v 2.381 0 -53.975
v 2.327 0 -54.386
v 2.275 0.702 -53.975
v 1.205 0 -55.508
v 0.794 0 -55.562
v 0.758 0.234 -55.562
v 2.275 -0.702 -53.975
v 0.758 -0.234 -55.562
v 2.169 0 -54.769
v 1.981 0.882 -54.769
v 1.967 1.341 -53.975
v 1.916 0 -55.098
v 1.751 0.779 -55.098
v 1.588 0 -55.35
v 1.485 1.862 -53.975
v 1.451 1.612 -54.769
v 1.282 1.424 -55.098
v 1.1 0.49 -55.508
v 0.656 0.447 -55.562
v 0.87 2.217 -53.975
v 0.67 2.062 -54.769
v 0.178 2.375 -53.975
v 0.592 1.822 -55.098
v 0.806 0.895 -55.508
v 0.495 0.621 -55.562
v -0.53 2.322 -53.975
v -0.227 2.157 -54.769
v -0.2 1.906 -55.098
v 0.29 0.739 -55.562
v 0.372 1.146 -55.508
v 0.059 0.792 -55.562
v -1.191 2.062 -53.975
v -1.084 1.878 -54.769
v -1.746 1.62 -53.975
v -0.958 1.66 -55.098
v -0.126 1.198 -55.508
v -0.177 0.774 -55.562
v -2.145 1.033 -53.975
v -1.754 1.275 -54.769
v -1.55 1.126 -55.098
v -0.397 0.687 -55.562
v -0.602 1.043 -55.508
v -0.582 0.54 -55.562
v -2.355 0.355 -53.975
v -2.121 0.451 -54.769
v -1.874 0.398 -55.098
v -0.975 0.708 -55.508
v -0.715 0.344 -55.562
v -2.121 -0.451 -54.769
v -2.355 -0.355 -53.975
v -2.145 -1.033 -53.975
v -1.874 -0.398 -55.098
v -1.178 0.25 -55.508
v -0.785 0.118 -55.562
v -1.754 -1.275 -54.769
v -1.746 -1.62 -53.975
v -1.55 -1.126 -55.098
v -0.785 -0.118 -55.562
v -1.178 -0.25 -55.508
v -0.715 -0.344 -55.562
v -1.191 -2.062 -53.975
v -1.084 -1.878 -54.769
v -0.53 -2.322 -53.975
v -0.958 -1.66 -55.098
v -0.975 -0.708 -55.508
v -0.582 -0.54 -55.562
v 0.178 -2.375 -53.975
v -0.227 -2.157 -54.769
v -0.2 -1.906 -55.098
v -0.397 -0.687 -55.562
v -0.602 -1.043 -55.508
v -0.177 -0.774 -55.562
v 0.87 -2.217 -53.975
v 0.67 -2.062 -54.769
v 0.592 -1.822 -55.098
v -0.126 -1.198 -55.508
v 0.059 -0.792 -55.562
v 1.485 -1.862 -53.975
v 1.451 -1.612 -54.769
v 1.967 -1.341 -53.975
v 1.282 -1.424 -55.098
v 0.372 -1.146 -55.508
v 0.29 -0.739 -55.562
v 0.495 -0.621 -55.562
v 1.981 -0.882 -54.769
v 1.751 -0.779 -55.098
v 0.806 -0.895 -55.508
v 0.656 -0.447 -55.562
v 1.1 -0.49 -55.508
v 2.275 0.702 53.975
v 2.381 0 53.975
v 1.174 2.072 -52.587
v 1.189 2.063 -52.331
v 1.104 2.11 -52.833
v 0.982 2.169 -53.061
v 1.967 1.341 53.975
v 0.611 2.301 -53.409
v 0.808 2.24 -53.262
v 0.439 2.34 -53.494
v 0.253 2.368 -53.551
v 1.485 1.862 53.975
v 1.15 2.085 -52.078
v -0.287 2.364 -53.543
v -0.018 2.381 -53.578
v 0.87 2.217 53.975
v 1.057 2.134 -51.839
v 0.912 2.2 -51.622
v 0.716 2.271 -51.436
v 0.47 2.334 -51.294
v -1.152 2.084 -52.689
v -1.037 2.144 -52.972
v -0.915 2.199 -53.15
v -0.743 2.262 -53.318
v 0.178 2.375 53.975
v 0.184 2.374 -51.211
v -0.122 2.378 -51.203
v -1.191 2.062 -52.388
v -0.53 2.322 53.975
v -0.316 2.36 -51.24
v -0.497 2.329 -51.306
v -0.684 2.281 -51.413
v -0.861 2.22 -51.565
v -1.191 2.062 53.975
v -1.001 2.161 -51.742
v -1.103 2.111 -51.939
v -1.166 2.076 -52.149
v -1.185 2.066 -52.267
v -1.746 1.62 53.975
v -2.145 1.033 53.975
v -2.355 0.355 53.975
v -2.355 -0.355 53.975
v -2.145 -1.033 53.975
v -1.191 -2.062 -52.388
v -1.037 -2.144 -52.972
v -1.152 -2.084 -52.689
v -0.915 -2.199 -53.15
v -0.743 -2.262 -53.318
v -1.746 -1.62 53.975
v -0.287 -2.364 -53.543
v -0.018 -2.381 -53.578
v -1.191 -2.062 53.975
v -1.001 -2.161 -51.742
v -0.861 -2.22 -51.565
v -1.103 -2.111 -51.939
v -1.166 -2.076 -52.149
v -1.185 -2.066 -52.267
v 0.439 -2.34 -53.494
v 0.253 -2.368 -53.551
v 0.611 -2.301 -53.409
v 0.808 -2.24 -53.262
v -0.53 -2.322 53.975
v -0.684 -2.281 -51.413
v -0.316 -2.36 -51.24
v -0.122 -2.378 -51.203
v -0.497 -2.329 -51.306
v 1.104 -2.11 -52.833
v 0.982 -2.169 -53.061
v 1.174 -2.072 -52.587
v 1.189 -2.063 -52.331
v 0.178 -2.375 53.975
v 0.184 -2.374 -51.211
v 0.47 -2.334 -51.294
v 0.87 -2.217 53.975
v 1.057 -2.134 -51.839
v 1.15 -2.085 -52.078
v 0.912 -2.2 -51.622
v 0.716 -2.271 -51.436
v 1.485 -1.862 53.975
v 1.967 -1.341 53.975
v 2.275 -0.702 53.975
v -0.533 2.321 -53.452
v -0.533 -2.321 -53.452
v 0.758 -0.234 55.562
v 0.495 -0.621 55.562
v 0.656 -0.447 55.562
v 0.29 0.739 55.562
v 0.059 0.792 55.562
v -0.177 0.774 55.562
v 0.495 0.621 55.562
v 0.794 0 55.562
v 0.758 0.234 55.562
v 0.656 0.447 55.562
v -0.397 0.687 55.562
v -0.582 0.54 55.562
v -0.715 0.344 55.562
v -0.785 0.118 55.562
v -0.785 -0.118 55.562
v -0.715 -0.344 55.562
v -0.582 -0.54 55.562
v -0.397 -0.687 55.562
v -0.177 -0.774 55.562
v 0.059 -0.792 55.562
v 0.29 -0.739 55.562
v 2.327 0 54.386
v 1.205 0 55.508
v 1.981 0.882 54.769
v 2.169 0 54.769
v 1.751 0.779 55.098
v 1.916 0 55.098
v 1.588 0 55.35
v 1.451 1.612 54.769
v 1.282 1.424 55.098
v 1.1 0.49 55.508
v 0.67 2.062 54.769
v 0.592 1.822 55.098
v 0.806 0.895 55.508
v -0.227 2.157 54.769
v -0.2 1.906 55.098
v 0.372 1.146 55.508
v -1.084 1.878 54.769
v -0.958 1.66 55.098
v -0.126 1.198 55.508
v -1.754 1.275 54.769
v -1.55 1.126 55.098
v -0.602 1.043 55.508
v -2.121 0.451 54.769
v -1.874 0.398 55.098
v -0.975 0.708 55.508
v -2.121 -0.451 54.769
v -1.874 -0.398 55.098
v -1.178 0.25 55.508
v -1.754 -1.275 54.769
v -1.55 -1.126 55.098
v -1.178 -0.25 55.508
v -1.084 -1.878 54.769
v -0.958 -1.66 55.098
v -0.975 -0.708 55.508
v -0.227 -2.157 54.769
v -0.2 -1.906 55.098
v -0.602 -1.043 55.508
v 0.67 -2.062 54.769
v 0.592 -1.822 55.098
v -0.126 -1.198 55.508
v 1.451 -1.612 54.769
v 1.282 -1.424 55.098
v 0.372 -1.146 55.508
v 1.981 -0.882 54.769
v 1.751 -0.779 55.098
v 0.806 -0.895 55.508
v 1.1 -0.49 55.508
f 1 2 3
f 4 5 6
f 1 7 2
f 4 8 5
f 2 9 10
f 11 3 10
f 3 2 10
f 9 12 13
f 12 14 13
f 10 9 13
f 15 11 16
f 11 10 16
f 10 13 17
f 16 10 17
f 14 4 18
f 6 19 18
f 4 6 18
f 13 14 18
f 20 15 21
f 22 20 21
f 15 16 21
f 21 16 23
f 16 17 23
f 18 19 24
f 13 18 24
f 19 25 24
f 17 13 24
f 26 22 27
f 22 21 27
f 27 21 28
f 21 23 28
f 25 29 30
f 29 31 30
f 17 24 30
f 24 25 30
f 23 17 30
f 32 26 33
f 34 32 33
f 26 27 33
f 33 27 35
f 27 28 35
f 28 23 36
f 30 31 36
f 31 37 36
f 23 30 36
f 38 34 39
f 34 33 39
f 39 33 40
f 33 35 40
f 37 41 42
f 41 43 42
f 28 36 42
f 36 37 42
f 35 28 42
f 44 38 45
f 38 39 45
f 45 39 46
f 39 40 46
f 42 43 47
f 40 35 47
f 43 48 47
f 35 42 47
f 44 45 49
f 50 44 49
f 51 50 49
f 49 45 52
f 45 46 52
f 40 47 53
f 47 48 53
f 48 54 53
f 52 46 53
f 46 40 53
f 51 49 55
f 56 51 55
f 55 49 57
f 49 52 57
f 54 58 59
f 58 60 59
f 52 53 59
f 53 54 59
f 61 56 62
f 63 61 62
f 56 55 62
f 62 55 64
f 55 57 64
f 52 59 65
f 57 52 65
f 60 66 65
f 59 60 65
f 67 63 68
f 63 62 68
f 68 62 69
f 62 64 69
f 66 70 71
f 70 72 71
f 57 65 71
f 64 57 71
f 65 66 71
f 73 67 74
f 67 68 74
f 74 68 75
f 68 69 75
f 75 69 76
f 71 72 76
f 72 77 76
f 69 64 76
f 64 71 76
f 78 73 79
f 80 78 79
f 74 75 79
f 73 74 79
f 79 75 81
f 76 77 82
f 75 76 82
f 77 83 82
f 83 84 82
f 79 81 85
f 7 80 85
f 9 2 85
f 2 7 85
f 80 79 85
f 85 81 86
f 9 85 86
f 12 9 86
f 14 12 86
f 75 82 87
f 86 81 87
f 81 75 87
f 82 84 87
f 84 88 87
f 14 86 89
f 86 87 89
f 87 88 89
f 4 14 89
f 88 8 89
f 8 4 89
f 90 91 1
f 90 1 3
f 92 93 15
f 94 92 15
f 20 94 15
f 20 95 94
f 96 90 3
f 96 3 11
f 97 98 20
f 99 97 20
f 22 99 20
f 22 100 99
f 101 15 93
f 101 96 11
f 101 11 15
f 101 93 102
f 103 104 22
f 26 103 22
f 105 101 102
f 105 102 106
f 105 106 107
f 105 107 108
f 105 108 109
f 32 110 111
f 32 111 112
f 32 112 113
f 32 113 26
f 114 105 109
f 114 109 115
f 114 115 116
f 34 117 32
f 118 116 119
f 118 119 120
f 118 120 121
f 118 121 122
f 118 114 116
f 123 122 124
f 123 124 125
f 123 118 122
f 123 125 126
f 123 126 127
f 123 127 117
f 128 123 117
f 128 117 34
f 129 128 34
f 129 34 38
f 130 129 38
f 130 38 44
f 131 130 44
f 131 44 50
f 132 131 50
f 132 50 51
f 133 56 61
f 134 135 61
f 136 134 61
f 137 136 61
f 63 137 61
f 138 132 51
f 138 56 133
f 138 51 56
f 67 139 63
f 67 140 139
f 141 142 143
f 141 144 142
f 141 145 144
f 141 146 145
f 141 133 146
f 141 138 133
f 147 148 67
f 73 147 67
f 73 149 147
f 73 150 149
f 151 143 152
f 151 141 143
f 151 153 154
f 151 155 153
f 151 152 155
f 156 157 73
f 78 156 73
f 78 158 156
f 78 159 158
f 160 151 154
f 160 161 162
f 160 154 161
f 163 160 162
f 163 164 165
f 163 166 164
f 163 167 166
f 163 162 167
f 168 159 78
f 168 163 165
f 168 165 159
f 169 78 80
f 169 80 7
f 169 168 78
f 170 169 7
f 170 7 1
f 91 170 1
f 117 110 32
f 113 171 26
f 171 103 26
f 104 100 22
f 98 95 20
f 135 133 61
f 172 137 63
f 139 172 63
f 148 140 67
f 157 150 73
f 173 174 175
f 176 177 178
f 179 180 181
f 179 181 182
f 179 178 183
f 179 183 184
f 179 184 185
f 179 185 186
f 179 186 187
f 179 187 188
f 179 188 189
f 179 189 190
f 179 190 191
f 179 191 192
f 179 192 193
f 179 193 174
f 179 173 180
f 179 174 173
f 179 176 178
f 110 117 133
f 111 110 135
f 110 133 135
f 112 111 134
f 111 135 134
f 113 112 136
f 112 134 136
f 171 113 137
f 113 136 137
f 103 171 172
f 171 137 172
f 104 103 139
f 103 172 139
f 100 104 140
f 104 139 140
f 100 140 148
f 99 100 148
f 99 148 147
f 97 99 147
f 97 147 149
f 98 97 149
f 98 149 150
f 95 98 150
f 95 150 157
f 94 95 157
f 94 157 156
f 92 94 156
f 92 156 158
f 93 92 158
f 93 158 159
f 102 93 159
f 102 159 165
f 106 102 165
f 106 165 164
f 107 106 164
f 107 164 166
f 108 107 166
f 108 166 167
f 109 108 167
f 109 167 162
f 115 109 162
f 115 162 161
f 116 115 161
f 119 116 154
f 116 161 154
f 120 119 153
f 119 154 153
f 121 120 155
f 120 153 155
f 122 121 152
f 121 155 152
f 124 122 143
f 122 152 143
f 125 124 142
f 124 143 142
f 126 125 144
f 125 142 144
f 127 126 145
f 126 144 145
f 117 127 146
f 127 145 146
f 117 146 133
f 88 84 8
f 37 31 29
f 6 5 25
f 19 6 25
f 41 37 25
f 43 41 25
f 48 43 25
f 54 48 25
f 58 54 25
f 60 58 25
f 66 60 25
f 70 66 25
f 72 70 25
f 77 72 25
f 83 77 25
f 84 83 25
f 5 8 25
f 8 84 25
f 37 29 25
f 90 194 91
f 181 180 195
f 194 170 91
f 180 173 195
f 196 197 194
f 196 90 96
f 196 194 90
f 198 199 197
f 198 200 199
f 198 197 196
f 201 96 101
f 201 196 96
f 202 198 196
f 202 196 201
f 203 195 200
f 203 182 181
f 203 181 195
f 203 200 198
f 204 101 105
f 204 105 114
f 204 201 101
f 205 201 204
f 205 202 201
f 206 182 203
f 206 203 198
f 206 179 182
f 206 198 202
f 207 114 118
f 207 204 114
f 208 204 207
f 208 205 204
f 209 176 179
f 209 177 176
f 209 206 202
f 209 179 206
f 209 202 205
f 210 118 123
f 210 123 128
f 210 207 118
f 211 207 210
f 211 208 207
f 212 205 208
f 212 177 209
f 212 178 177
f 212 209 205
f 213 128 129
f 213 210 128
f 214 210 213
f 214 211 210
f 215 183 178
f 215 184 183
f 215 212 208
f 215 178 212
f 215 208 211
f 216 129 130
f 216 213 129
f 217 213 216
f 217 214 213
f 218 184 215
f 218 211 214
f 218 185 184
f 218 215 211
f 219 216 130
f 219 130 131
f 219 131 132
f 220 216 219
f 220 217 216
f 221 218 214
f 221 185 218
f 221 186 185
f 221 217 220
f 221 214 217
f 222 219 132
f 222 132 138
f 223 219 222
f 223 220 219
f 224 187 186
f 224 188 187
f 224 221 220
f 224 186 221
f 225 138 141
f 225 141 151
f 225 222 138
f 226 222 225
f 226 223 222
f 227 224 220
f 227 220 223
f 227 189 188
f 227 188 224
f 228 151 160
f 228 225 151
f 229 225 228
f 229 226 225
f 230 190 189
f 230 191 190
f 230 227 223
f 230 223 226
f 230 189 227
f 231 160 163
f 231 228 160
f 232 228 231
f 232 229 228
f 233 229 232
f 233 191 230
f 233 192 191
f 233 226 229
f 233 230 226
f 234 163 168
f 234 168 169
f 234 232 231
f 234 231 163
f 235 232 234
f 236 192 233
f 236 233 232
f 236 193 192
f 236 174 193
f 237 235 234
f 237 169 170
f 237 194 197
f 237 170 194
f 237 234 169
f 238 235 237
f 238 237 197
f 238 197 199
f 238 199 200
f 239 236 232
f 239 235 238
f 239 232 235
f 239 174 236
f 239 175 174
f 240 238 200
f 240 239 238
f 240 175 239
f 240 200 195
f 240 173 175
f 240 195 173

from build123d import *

# Parameters (mm, degrees)
SKETCH3_R                       = 2.38125
BOSS_EXTRUDE1_DEPTH             = 55.5625
FILLET2_R                       = 1.5875
F_3_32_0_09375_DIAMETER_HOLE3_D = 2.38125
FILLET3_R                       = 1.5875


with BuildPart() as part:
    # Sketch3 → Boss-Extrude1 (new, symmetric)
    with BuildSketch(Plane.XY):
        Circle(SKETCH3_R)
    extrude(amount=BOSS_EXTRUDE1_DEPTH, both=True)

    # Fillet2
    fillet2_edges = [part.edges().sort_by_distance(p)[0] for p in [
        (-2.38125, 0, 55.5625),
    ]]
    fillet(fillet2_edges, radius=FILLET2_R)

    # 3/32 (0.09375) Diameter Hole3 (through all)
    with Locations(Plane(origin=(0, 2.38125, 0), x_dir=(1, 0, 0), z_dir=(0, 1, 0))):
        with Locations((0, 52.3875)):
            Hole(F_3_32_0_09375_DIAMETER_HOLE3_D / 2)

    # Fillet3
    fillet3_edges = [part.edges().sort_by_distance(p)[0] for p in [
        (-2.38125, 0, -55.5625),
    ]]
    fillet(fillet3_edges, radius=FILLET3_R)


solid = part.part
